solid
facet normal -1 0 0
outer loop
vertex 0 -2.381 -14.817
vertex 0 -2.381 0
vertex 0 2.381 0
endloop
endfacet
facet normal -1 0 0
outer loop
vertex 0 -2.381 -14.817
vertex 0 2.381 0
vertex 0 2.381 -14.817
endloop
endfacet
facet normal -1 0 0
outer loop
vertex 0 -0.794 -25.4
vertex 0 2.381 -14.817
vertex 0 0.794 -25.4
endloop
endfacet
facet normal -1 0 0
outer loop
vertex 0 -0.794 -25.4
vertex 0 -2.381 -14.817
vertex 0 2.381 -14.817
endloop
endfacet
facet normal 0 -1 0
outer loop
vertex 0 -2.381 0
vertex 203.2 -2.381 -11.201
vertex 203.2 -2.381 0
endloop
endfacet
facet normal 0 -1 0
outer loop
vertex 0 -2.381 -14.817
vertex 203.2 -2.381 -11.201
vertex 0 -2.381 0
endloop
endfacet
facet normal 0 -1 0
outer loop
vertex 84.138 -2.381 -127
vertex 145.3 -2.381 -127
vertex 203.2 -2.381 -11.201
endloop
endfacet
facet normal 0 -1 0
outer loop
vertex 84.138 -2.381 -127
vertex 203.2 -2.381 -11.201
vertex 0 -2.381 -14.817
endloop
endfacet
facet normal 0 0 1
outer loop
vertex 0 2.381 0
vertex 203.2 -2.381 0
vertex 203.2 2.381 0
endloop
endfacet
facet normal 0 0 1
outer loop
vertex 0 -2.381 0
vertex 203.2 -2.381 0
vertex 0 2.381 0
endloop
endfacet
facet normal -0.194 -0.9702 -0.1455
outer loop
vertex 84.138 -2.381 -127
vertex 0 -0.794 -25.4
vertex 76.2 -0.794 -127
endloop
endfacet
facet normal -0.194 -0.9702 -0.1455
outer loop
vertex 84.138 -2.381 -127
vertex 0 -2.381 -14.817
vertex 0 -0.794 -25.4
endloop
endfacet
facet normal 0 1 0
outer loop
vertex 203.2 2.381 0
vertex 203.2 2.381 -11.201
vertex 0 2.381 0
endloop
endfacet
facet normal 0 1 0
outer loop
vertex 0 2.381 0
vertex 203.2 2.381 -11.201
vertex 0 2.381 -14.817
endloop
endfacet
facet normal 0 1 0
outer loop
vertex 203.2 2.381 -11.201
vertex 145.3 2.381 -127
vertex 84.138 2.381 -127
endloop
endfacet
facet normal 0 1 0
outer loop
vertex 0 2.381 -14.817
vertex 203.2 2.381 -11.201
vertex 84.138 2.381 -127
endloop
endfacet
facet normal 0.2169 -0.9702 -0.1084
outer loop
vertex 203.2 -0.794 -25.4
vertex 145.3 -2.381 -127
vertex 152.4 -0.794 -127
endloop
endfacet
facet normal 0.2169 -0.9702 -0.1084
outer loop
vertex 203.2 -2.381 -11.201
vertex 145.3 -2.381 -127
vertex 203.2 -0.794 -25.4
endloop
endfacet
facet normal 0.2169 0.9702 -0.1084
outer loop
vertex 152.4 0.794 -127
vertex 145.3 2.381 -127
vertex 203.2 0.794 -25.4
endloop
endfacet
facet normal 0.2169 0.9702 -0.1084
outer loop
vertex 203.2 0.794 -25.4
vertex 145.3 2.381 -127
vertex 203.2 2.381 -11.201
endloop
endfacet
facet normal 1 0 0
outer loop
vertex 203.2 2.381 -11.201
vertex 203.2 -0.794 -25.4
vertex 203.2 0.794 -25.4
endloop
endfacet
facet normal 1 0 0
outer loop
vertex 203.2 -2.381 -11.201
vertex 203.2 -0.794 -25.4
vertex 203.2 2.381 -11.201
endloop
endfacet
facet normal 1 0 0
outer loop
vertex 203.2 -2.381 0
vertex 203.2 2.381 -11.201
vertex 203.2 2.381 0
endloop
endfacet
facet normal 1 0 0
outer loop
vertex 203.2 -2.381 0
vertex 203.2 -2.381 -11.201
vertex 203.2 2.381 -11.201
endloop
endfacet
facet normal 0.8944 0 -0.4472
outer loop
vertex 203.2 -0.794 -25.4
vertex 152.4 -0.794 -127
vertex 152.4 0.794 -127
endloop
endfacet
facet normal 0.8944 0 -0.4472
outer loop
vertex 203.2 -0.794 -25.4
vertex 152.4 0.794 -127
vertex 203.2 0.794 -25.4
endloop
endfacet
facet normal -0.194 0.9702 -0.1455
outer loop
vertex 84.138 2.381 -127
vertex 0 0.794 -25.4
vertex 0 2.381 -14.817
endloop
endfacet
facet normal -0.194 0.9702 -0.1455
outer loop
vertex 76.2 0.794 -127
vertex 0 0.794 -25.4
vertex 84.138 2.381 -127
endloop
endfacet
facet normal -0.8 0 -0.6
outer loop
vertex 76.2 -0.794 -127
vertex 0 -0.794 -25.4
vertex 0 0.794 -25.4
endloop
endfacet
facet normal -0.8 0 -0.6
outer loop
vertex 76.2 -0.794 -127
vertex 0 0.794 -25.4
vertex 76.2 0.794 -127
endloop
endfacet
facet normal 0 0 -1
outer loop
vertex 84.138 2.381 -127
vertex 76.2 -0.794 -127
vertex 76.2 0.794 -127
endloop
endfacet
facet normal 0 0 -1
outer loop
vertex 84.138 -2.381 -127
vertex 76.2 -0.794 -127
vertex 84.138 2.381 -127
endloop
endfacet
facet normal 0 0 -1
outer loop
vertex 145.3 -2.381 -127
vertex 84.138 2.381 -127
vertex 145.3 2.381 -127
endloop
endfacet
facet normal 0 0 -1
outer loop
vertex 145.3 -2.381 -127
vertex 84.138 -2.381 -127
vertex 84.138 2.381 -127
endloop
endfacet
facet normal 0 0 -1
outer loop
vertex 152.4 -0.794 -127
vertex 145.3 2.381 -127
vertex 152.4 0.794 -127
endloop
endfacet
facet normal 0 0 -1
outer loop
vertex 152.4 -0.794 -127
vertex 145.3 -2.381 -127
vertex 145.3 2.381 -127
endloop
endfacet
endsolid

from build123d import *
from OCP.BRepFilletAPI import BRepFilletAPI_MakeChamfer

# Parameters (mm, degrees)
BOSS_EXTRUDE1_DEPTH      = 2.38125
BOSS_EXTRUDE1_DEPTH_BACK = 2.38125
CHAMFER1_SIZE            = 1.5875
CHAMFER1_SIZE2           = 6.35
CHAMFER3_SIZE            = 6.35
CHAMFER3_SIZE2           = 1.5875


with BuildPart() as part:
    # Sketch1 → Boss-Extrude1 (new, two sides: drawn at the far end of the back side and taken through both)
    with BuildSketch(Plane(origin=(0, 0, 0), x_dir=(1, 0, 0), z_dir=(0, 1, 0)).offset(-BOSS_EXTRUDE1_DEPTH_BACK)):
        Polygon((0, 0), (0, 25.4), (76.2, 127), (152.4, 127), (203.2, 25.4), (203.2, 0), align=None)
    extrude(amount=BOSS_EXTRUDE1_DEPTH + BOSS_EXTRUDE1_DEPTH_BACK)

    # Chamfer1: one chamfer whose edges measure the first distance from different faces: ONE call of the kernel's chamfer builder (chamfer() names one face for all edges)
    chamfer1_edges_1 = [part.edges().sort_by_distance(p)[0] for p in [
        (177.8, 2.38125, -76.2),
        (177.8, -2.38125, -76.2),
    ]]
    chamfer1_side_1 = [part.faces().sort_by_distance(p)[0] for p in [
        (177.8, 0, -76.2),
    ]]
    chamfer1_edges_2 = [part.edges().sort_by_distance(p)[0] for p in [
        (38.1, -2.38125, -76.2),
    ]]
    chamfer1_side_2 = [part.faces().sort_by_distance(p)[0] for p in [
        (38.1, 0, -76.2),
    ]]
    chamfer1 = BRepFilletAPI_MakeChamfer(part.part.solid().wrapped)
    for e in chamfer1_edges_1:
        chamfer1.Add(CHAMFER1_SIZE, CHAMFER1_SIZE2, e.wrapped, chamfer1_side_1[0].wrapped)  # the first distance lies on this face
    for e in chamfer1_edges_2:
        chamfer1.Add(CHAMFER1_SIZE, CHAMFER1_SIZE2, e.wrapped, chamfer1_side_2[0].wrapped)  # the first distance lies on this face
    add(Compound.cast(chamfer1.Shape()), mode=Mode.REPLACE)

    # Chamfer3
    chamfer3_edges = [part.edges().sort_by_distance(p)[0] for p in [
        (38.1, 2.38125, -76.2),
    ]]
    chamfer3_side = [part.faces().sort_by_distance(p)[0] for p in [
        (102.626088035, 2.38125, -52.835240535),
    ]]
    chamfer(chamfer3_edges, length=CHAMFER3_SIZE, length2=CHAMFER3_SIZE2, reference=chamfer3_side[0])


solid = part.part
